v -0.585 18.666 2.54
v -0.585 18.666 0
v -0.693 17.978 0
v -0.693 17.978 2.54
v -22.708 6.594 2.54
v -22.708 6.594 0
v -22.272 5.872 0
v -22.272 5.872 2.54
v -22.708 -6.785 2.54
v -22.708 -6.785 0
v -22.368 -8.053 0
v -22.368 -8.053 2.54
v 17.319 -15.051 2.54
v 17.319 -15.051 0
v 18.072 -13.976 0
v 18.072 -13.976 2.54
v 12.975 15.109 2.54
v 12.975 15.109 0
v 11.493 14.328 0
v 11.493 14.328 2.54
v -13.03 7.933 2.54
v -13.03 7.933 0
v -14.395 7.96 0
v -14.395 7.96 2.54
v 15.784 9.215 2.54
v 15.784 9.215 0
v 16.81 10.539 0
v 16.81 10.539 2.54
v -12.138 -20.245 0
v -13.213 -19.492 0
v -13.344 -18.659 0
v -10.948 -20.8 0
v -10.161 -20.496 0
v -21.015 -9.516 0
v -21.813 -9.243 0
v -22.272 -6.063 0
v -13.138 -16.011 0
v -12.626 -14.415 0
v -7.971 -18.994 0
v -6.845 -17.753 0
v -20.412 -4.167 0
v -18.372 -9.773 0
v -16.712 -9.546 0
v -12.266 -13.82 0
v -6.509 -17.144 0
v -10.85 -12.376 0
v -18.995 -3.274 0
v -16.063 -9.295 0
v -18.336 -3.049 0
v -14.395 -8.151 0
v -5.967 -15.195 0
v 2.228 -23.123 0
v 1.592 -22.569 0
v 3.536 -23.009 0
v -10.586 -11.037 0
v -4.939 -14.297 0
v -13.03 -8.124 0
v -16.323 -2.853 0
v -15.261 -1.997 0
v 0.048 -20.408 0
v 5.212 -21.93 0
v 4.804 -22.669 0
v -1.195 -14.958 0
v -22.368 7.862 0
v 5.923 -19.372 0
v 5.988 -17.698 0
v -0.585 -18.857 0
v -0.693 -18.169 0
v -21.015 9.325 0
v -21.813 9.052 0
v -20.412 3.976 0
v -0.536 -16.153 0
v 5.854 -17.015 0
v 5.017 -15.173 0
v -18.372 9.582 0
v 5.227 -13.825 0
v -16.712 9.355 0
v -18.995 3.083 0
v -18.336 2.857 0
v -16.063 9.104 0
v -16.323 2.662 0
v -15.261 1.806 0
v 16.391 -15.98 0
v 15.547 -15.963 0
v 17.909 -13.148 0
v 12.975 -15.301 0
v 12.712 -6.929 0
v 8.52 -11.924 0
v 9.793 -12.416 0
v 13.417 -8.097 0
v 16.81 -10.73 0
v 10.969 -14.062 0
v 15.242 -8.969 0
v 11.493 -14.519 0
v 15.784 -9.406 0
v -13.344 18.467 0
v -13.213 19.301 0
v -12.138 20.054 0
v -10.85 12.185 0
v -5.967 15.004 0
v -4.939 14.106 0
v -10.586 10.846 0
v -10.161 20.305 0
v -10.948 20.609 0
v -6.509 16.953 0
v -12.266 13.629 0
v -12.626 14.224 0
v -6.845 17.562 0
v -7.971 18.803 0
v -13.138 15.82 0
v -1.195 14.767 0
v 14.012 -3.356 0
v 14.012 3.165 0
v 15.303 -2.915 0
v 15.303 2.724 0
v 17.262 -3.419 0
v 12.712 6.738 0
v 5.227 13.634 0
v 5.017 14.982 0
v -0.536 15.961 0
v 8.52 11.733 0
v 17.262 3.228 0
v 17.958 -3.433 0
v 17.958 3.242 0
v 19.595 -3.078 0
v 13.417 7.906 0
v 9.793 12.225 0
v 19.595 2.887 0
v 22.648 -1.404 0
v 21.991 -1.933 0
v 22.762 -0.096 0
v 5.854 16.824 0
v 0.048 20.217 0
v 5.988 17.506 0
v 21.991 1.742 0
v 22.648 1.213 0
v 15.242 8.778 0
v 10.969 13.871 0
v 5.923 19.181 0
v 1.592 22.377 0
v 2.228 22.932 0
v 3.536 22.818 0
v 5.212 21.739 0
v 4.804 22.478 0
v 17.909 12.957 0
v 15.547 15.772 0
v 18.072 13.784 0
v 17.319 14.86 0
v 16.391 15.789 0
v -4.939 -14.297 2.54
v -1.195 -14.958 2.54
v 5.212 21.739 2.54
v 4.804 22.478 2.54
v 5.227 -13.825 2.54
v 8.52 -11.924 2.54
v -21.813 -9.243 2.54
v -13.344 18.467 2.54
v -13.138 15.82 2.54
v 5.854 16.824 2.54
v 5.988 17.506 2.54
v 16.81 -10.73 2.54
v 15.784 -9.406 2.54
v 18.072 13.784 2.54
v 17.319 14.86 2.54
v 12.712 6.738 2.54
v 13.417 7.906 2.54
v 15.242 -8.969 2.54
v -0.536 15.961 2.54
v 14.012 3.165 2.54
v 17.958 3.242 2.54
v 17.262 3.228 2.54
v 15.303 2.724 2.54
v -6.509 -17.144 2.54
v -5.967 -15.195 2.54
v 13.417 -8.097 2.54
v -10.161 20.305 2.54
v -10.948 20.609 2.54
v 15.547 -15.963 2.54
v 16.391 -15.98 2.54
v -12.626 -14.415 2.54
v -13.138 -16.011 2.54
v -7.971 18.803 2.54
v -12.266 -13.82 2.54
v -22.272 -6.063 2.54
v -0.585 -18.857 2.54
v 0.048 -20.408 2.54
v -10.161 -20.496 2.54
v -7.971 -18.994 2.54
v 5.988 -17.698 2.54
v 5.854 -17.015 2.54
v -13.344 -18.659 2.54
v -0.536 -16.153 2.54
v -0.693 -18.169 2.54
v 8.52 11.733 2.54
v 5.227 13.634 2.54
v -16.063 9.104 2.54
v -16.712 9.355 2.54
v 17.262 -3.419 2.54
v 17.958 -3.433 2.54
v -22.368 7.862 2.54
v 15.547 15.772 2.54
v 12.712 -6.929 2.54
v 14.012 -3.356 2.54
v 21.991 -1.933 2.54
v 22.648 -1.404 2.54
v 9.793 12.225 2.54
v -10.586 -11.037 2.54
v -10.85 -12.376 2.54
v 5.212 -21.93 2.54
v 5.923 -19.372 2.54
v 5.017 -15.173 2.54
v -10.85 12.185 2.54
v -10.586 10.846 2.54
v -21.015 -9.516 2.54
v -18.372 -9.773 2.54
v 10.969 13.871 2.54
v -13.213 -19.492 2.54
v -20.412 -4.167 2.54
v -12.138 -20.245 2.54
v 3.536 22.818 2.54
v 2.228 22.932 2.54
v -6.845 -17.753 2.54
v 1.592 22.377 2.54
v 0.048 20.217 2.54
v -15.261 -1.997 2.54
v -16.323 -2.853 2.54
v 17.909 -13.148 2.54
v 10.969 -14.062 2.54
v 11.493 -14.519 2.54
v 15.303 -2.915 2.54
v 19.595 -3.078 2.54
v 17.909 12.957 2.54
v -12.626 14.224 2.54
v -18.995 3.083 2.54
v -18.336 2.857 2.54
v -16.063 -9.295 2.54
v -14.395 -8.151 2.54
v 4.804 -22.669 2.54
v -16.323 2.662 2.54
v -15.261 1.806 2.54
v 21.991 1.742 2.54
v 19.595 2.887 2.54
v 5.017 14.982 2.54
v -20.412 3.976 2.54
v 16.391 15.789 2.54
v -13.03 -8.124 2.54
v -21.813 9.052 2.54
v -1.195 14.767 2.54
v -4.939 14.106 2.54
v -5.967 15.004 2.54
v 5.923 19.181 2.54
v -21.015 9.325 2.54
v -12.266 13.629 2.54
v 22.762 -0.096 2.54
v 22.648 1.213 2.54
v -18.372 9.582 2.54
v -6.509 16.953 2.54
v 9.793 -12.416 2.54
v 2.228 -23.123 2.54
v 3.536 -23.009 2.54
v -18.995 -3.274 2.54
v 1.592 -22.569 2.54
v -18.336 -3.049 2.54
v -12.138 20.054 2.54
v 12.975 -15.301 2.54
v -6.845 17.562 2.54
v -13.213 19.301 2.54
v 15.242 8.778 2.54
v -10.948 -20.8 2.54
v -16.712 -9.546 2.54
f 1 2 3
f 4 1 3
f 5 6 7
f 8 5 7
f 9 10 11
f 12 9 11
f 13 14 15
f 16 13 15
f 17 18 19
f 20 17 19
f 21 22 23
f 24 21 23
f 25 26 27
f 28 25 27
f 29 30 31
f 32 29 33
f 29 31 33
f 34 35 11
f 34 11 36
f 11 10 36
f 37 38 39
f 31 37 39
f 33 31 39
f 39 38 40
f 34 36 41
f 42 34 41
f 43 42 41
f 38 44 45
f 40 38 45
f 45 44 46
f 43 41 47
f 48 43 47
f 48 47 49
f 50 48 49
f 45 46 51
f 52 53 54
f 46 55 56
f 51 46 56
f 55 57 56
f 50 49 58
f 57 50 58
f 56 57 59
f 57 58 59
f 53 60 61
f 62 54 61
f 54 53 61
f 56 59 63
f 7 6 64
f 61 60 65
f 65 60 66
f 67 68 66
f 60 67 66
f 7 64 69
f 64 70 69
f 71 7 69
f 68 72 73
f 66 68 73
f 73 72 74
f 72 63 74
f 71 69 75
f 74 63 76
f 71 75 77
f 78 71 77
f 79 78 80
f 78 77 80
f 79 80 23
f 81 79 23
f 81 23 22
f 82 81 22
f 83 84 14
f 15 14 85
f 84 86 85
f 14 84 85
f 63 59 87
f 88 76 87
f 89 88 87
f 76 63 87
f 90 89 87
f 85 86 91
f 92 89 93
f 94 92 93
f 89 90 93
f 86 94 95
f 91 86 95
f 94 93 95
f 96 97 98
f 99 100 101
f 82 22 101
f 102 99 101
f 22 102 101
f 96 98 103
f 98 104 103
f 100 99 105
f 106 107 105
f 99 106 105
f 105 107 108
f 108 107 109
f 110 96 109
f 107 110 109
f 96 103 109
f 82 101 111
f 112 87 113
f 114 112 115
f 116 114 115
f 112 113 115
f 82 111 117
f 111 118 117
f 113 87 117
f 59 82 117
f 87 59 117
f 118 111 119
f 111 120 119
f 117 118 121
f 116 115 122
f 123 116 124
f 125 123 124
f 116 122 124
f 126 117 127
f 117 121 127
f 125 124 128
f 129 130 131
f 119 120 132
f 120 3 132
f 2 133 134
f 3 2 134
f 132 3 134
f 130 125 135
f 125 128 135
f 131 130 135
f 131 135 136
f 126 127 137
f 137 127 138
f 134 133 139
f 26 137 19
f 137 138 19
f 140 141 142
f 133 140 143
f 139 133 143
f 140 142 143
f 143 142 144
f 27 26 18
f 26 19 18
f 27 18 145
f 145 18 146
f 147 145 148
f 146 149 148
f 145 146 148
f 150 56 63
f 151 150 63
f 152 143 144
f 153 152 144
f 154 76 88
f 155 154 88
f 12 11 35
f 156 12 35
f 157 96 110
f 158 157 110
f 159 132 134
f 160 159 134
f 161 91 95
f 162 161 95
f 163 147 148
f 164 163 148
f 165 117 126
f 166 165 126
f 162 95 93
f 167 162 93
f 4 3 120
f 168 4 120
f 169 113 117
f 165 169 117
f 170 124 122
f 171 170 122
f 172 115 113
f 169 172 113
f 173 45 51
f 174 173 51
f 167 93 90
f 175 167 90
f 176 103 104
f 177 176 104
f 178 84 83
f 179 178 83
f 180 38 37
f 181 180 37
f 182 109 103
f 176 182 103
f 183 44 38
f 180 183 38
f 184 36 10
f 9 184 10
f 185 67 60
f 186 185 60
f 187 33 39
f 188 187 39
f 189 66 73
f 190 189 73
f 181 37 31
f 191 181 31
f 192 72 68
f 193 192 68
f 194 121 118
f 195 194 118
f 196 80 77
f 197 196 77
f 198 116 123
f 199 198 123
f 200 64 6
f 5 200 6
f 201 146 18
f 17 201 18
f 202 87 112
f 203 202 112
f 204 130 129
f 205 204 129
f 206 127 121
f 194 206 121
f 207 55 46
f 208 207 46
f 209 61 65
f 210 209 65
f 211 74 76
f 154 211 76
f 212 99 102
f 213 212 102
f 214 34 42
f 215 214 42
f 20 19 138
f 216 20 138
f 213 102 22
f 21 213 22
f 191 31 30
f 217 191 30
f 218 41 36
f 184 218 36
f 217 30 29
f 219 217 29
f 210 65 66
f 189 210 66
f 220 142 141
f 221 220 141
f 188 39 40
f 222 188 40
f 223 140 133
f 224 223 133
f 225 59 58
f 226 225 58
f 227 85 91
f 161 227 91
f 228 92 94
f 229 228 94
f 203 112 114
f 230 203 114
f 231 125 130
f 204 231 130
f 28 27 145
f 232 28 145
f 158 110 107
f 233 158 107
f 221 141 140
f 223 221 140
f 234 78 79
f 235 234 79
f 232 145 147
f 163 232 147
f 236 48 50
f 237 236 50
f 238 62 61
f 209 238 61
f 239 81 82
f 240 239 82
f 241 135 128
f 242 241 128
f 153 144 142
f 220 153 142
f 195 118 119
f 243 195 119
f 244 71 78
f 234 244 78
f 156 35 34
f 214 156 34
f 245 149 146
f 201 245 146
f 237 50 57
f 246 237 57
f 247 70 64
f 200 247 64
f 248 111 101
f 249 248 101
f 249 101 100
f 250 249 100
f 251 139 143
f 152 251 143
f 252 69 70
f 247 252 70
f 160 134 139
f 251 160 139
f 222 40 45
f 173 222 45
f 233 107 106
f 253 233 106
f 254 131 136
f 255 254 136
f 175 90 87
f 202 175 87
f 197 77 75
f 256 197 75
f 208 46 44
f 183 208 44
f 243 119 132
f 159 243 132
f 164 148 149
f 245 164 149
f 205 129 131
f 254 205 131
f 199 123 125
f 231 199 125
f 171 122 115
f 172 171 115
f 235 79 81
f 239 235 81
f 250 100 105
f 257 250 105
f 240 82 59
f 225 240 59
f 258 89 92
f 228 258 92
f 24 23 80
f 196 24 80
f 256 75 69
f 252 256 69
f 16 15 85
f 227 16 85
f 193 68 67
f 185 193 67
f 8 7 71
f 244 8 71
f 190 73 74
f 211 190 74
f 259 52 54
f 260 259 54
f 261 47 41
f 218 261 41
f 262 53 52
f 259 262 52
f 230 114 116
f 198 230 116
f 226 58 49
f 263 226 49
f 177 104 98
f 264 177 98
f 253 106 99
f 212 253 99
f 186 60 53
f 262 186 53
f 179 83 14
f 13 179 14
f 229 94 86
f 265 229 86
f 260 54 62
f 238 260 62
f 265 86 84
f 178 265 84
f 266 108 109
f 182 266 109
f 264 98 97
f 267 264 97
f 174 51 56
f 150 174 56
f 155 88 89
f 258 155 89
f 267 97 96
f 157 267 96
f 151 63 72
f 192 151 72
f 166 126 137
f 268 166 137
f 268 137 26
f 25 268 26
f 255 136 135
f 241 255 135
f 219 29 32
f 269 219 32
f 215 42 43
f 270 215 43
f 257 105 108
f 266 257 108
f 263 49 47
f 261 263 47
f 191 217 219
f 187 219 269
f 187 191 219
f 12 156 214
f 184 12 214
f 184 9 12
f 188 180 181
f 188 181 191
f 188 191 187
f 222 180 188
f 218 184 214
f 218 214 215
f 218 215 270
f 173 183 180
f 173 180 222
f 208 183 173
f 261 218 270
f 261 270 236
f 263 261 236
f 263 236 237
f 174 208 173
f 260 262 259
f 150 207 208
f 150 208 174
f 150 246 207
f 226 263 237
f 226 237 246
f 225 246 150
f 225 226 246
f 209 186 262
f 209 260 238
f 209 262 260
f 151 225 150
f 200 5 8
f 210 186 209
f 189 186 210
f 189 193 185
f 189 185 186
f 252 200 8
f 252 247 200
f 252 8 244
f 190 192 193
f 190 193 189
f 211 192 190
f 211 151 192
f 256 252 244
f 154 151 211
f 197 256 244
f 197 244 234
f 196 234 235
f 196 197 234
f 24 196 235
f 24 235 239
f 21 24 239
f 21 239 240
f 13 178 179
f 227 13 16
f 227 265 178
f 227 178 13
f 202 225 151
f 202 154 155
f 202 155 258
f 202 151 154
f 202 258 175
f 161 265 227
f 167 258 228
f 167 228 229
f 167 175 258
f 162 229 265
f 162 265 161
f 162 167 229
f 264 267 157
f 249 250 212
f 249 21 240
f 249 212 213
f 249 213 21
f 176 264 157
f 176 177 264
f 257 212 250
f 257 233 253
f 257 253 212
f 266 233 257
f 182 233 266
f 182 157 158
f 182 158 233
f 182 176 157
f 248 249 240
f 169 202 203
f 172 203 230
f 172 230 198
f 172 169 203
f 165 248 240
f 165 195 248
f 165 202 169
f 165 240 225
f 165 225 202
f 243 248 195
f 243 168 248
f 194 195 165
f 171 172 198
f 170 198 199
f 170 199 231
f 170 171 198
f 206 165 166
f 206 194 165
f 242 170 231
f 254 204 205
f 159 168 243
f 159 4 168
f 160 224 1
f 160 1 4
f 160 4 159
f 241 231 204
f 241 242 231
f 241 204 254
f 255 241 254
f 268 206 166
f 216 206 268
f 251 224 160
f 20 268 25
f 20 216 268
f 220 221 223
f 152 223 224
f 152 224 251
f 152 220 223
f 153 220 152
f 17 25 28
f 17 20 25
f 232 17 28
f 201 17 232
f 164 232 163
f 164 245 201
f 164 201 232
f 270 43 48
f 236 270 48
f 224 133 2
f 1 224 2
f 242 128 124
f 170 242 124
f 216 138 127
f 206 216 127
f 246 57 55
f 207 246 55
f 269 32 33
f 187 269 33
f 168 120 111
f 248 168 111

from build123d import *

# Parameters (mm, degrees)
F1_DEPTH = 2.54


with BuildPart() as f1:
    # F0 (on Top) → F1 (new body)
    with BuildSketch(Plane.XY):
        Polygon((15.546987, -15.963222), (16.390529, -15.979688), (17.319008, -15.051209), (18.072152, -13.975608), (17.909457, -13.14774), (16.810267, -10.730381), (15.783584, -9.406071), (15.241934, -8.9693), (13.41697, -8.096944), (12.711619, -6.928926), (14.012052, -3.356017), (15.303169, -2.914654), (17.261912, -3.419454), (17.957592, -3.433034), (19.595327, -3.078493), (21.991203, -1.933234), (22.647978, -1.403629), (22.762419, -0.095559), (22.647978, 1.212511), (21.991203, 1.742116), (19.595327, 2.887375), (17.957592, 3.241916), (17.261912, 3.228336), (15.303169, 2.723536), (14.012052, 3.164899), (12.711619, 6.737808), (13.41697, 7.905826), (15.241934, 8.778182), (15.783584, 9.214953), (16.810267, 10.539263), (17.909457, 12.956622), (18.072152, 13.78449), (17.319008, 14.860091), (16.390529, 15.78857), (15.546987, 15.772104), (12.975481, 15.109383), (11.493009, 14.328262), (10.968816, 13.870685), (9.792812, 12.224929), (8.520056, 11.733119), (5.227245, 13.634224), (5.016787, 14.982369), (5.854051, 16.823696), (5.988228, 17.506449), (5.923463, 19.180868), (5.211642, 21.739218), (4.804131, 22.477979), (3.535806, 22.817826), (2.227736, 22.932268), (1.592129, 22.377436), (0.04823, 20.21683), (-0.585315, 18.665542), (-0.692745, 17.978073), (-0.535745, 15.96143), (-1.194603, 14.766569), (-4.93905, 14.106322), (-5.96684, 15.003781), (-6.509041, 16.952503), (-6.845121, 17.561769), (-7.97103, 18.802818), (-10.160792, 20.305079), (-10.94783, 20.60906), (-12.137873, 20.054134), (-13.213474, 19.30099), (-13.343738, 18.467404), (-13.137623, 15.819884), (-12.625797, 14.224294), (-12.266197, 13.628607), (-10.849655, 12.184687), (-10.586328, 10.845865), (-13.030342, 7.933202), (-14.394551, 7.960045), (-16.062515, 9.104332), (-16.711595, 9.355029), (-18.371823, 9.582008), (-21.014912, 9.325254), (-21.813214, 9.052219), (-22.36814, 7.862176), (-22.707986, 6.593851), (-22.271956, 5.871555), (-20.41227, 3.975926), (-18.994563, 3.082628), (-18.336193, 2.857452), (-16.322925, 2.66188), (-15.260626, 1.805546), (-15.260626, -1.996664), (-16.322925, -2.852998), (-18.336193, -3.04857), (-18.994563, -3.273746), (-20.41227, -4.167044), (-22.271956, -6.062673), (-22.707986, -6.784969), (-22.36814, -8.053294), (-21.813214, -9.243337), (-21.014912, -9.516372), (-18.371823, -9.773126), (-16.711595, -9.546147), (-16.062515, -9.29545), (-14.394551, -8.151163), (-13.030342, -8.12432), (-10.586328, -11.036983), (-10.849655, -12.375805), (-12.266197, -13.819725), (-12.625797, -14.415412), (-13.137623, -16.011002), (-13.343738, -18.658522), (-13.213474, -19.492108), (-12.137873, -20.245252), (-10.94783, -20.800178), (-10.160792, -20.496197), (-7.97103, -18.993936), (-6.845121, -17.752887), (-6.509041, -17.143621), (-5.96684, -15.194899), (-4.93905, -14.29744), (-1.194603, -14.957687), (-0.535745, -16.152548), (-0.692745, -18.169191), (-0.585315, -18.85666), (0.04823, -20.407948), (1.592129, -22.568554), (2.227736, -23.123386), (3.535806, -23.008944), (4.804131, -22.669097), (5.211642, -21.930336), (5.923463, -19.371986), (5.988228, -17.697567), (5.854051, -17.014814), (5.016787, -15.173487), (5.227245, -13.825342), (8.520056, -11.924237), (9.792812, -12.416047), (10.968816, -14.061803), (11.493009, -14.51938), (12.975481, -15.300501), align=None)
    extrude(amount=F1_DEPTH)


solid = f1.part
